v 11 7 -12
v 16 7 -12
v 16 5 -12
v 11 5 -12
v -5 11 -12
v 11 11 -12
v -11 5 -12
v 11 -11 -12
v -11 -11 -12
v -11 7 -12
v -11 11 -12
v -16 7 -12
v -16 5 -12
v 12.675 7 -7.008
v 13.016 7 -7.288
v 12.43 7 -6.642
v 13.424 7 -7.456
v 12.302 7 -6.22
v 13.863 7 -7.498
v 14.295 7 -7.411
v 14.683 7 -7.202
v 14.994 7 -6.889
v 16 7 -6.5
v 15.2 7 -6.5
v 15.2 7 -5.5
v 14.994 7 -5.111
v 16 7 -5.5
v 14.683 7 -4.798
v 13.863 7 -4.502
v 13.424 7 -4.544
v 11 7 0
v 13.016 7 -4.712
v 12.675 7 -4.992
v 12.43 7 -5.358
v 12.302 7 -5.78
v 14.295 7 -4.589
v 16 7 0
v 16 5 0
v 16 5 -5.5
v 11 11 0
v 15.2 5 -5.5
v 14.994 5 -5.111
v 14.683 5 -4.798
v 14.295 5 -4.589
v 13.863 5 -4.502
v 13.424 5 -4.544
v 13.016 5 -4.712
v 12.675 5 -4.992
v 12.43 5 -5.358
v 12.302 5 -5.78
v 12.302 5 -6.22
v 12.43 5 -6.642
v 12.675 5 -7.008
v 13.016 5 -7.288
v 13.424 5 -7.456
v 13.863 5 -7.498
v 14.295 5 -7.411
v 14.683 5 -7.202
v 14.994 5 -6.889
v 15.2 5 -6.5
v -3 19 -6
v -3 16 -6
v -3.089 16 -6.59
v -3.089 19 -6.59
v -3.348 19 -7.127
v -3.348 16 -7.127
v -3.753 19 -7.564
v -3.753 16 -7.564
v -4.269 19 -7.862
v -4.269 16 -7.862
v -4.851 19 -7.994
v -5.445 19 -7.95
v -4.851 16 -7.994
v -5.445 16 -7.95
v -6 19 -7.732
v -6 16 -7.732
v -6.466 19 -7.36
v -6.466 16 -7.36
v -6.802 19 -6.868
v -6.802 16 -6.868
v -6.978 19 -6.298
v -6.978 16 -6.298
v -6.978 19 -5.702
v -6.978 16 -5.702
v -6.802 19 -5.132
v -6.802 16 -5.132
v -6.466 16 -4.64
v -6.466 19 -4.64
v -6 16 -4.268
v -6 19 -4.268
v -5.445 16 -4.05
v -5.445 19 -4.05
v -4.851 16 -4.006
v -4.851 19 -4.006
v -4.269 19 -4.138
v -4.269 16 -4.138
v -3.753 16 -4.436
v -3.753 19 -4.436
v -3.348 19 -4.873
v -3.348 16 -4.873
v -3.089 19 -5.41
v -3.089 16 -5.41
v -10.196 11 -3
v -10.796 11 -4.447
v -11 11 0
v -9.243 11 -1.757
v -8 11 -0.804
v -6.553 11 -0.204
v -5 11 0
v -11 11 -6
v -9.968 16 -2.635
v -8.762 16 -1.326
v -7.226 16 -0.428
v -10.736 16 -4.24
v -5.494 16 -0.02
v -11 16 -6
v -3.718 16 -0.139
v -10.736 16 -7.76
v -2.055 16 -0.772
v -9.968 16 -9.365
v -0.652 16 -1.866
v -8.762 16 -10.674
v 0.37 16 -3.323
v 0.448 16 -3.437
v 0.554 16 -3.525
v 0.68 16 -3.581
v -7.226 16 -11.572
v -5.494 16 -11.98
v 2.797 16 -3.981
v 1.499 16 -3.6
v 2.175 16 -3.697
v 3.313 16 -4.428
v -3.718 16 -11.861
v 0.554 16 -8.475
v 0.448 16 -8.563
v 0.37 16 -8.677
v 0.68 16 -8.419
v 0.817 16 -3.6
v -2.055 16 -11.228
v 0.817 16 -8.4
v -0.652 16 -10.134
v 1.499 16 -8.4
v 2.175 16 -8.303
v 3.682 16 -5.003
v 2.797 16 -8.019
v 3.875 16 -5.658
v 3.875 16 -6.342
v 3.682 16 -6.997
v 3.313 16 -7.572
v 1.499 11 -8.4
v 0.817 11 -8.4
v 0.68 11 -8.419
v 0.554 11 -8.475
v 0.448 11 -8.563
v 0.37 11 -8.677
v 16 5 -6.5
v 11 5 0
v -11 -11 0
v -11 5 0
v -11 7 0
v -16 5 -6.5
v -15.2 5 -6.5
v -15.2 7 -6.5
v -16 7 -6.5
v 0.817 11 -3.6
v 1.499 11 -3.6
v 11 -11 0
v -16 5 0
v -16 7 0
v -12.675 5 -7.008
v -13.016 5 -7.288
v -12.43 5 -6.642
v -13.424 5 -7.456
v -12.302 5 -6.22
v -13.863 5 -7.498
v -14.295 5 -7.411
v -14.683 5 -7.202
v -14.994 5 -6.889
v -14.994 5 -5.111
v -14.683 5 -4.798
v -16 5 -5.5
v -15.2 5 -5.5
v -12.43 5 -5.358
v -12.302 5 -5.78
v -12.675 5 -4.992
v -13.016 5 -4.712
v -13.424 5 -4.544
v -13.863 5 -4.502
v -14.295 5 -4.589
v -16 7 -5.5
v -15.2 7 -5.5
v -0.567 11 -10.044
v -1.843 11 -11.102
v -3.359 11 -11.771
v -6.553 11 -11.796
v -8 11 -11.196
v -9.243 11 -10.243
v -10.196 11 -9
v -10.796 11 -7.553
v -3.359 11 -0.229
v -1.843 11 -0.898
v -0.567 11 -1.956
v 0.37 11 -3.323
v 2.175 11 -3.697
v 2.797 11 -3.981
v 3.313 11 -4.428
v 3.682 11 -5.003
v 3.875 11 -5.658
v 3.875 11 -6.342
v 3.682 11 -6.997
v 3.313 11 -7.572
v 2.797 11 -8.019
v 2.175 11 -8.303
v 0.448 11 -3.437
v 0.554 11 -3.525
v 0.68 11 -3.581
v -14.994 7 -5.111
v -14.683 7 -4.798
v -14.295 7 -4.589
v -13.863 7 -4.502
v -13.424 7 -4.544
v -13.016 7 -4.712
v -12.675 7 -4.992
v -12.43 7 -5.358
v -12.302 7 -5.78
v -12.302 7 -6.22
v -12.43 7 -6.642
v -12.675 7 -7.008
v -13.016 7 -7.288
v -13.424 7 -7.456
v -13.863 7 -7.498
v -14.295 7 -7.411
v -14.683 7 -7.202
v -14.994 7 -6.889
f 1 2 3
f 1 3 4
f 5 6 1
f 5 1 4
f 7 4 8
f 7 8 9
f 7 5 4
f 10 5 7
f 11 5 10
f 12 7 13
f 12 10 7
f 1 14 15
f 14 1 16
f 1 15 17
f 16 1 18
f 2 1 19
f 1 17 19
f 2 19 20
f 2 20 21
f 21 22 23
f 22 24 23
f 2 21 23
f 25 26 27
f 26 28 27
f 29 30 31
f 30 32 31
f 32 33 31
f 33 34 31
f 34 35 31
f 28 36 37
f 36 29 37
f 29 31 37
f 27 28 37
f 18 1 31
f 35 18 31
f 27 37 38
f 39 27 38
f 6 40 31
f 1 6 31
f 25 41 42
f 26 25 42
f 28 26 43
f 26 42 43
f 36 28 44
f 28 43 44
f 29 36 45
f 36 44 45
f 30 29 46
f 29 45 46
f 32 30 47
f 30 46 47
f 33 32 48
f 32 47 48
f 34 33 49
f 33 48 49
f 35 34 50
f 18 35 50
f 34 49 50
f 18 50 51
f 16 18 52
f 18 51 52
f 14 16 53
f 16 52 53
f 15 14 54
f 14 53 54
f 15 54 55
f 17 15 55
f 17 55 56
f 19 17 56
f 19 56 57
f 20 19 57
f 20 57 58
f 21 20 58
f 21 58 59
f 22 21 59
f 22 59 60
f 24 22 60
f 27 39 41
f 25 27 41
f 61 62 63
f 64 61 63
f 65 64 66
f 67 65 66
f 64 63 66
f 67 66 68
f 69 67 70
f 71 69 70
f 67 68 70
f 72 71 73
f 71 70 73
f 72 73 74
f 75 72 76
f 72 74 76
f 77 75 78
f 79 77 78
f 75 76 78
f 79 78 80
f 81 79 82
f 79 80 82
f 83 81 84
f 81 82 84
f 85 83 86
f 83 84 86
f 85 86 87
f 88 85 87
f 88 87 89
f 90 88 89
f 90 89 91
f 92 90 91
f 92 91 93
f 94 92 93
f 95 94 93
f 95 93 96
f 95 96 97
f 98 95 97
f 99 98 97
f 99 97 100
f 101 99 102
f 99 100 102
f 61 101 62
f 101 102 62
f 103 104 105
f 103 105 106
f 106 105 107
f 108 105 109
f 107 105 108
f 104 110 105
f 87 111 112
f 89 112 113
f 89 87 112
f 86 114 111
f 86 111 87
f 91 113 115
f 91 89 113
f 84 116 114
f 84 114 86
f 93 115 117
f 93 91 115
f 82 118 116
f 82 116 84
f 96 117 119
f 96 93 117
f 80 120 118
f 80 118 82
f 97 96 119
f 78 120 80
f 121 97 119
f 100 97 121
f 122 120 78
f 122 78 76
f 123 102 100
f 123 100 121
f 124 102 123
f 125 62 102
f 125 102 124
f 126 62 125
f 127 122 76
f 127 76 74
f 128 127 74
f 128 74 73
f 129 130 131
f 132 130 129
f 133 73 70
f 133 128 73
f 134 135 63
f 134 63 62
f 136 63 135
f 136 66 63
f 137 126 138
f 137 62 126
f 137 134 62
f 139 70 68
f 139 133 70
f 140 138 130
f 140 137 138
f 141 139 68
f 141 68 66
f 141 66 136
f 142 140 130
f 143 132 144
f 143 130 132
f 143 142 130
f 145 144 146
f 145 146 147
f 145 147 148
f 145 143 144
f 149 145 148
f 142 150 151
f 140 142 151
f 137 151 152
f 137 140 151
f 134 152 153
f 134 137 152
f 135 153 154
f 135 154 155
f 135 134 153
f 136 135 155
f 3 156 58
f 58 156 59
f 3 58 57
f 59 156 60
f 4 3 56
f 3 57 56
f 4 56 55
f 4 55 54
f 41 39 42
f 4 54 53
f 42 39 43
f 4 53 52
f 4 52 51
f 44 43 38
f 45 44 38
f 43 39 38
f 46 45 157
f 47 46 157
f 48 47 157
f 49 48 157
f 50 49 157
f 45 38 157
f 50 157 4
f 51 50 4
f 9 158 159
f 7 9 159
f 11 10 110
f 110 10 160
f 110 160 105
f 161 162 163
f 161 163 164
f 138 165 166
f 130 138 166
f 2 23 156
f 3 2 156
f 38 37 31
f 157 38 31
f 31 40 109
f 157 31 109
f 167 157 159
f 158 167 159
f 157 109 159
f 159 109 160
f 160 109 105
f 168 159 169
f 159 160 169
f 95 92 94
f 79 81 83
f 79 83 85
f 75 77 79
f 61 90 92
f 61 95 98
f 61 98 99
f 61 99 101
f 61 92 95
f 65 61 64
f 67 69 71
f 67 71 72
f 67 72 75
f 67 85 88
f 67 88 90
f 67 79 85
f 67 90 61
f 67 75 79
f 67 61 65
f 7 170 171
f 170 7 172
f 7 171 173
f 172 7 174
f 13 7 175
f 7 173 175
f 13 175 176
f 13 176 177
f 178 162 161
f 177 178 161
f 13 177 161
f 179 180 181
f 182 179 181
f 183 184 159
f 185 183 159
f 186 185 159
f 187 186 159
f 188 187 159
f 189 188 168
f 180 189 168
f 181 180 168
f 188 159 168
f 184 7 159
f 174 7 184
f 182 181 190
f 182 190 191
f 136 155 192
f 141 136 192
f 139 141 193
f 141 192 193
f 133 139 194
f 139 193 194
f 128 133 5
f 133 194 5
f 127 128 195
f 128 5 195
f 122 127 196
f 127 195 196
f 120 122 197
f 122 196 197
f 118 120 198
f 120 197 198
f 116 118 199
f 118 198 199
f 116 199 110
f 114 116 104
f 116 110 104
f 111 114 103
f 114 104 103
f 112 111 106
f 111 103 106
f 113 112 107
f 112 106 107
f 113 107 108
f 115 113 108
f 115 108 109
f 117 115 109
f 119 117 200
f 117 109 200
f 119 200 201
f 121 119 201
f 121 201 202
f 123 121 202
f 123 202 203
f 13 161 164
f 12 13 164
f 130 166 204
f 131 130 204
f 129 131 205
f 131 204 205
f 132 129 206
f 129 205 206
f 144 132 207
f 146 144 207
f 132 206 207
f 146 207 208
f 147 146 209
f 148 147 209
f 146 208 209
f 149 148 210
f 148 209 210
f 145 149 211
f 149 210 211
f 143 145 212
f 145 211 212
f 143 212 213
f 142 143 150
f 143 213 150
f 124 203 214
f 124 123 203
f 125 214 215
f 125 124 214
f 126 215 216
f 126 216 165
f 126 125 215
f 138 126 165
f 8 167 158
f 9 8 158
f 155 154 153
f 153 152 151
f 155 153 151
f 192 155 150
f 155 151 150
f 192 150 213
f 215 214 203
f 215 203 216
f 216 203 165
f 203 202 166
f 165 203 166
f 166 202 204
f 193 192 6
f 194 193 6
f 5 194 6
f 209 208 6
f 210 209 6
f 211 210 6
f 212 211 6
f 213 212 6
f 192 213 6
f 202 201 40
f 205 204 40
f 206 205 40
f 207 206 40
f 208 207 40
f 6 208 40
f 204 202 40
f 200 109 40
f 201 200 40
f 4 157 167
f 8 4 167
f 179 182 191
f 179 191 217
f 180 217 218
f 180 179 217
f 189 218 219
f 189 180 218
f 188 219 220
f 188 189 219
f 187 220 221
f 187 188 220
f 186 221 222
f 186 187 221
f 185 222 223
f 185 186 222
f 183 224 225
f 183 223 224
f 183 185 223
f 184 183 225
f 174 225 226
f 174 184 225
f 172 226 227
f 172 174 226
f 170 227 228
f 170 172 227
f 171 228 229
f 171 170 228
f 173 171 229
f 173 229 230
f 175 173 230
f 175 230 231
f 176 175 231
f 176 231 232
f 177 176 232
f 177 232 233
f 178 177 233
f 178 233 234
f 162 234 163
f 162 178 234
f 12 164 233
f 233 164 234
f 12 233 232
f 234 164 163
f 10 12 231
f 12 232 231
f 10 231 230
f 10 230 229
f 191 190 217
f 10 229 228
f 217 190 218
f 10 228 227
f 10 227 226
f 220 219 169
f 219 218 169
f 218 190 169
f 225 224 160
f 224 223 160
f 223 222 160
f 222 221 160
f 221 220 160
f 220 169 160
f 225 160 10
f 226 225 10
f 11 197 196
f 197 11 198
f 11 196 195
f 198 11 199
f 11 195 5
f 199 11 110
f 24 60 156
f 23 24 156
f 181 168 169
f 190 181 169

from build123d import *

# Parameters (mm, degrees)
BOSS_EXTRUDE1_DEPTH = 12
BOSS_EXTRUDE2_DEPTH = 5
CUT_EXTRUDE1_START  = -19
CUT_EXTRUDE1_DEPTH  = 29
SKETCH4_R           = 2
BOSS_EXTRUDE3_DEPTH = 3
FILLET1_R           = 0.5


with BuildPart() as part:
    # Sketch1 → Boss-Extrude1 (new body)
    with BuildSketch(Plane.XY):
        Polygon((11, 7), (16, 7), (16, 5), (11, 5), (11, -11), (-11, -11), (-11, 5), (-16, 5), (-16, 7), (-11, 7), (-11, 11), (11, 11), align=None)
    extrude(amount=-BOSS_EXTRUDE1_DEPTH)

    # Sketch2 → Boss-Extrude2 (add)
    with BuildSketch(Plane(origin=(0, 11, 0), x_dir=(1, 0, 0), z_dir=(0, 1, 0))):
        with BuildLine():
            Line((1.499090834, 8.4), (0.499090834, 8.4))
            ThreePointArc((0.499090834, 8.4), (-11, 6), (0.499090834, 3.6))
            Line((0.499090834, 3.6), (1.499090834, 3.6))
            ThreePointArc((1.499090834, 3.6), (3.899090834, 6), (1.499090834, 8.4))
        make_face()
    extrude(amount=BOSS_EXTRUDE2_DEPTH)

    # Sketch3 → Cut-Extrude1 (cut)
    with BuildSketch(Plane(origin=(0, 7, 0), x_dir=(1, 0, 0), z_dir=(0, 1, 0)).offset(CUT_EXTRUDE1_START)):
        with BuildLine():
            Line((15.2, 6.5), (16, 6.5))
            Line((16, 6.5), (16, 5.5))
            Line((16, 5.5), (15.2, 5.5))
            ThreePointArc((15.2, 5.5), (12.285786438, 6), (15.2, 6.5))
        make_face()
    cut_extrude1 = extrude(amount=CUT_EXTRUDE1_DEPTH, mode=Mode.SUBTRACT)

    # Mirror1: Cut-Extrude1 across plane
    add(cut_extrude1.mirror(Plane(origin=(0, 0, 0), x_dir=(0, 0, 1), z_dir=(1, 0, 0))), mode=Mode.SUBTRACT)

    # Sketch4 → Boss-Extrude3 (add)
    with BuildSketch(Plane(origin=(0, 16, 0), x_dir=(1, 0, 0), z_dir=(0, 1, 0))):
        with Locations((-5, 6)):
            Circle(SKETCH4_R)
    extrude(amount=BOSS_EXTRUDE3_DEPTH)

    # Fillet1
    fillet1_edges = [part.edges().sort_by_distance(p)[0] for p in [
        (0.499090834, 13.5, -8.4),
        (0.499090834, 13.5, -3.6),
    ]]
    fillet(fillet1_edges, radius=FILLET1_R)


solid = part.part
